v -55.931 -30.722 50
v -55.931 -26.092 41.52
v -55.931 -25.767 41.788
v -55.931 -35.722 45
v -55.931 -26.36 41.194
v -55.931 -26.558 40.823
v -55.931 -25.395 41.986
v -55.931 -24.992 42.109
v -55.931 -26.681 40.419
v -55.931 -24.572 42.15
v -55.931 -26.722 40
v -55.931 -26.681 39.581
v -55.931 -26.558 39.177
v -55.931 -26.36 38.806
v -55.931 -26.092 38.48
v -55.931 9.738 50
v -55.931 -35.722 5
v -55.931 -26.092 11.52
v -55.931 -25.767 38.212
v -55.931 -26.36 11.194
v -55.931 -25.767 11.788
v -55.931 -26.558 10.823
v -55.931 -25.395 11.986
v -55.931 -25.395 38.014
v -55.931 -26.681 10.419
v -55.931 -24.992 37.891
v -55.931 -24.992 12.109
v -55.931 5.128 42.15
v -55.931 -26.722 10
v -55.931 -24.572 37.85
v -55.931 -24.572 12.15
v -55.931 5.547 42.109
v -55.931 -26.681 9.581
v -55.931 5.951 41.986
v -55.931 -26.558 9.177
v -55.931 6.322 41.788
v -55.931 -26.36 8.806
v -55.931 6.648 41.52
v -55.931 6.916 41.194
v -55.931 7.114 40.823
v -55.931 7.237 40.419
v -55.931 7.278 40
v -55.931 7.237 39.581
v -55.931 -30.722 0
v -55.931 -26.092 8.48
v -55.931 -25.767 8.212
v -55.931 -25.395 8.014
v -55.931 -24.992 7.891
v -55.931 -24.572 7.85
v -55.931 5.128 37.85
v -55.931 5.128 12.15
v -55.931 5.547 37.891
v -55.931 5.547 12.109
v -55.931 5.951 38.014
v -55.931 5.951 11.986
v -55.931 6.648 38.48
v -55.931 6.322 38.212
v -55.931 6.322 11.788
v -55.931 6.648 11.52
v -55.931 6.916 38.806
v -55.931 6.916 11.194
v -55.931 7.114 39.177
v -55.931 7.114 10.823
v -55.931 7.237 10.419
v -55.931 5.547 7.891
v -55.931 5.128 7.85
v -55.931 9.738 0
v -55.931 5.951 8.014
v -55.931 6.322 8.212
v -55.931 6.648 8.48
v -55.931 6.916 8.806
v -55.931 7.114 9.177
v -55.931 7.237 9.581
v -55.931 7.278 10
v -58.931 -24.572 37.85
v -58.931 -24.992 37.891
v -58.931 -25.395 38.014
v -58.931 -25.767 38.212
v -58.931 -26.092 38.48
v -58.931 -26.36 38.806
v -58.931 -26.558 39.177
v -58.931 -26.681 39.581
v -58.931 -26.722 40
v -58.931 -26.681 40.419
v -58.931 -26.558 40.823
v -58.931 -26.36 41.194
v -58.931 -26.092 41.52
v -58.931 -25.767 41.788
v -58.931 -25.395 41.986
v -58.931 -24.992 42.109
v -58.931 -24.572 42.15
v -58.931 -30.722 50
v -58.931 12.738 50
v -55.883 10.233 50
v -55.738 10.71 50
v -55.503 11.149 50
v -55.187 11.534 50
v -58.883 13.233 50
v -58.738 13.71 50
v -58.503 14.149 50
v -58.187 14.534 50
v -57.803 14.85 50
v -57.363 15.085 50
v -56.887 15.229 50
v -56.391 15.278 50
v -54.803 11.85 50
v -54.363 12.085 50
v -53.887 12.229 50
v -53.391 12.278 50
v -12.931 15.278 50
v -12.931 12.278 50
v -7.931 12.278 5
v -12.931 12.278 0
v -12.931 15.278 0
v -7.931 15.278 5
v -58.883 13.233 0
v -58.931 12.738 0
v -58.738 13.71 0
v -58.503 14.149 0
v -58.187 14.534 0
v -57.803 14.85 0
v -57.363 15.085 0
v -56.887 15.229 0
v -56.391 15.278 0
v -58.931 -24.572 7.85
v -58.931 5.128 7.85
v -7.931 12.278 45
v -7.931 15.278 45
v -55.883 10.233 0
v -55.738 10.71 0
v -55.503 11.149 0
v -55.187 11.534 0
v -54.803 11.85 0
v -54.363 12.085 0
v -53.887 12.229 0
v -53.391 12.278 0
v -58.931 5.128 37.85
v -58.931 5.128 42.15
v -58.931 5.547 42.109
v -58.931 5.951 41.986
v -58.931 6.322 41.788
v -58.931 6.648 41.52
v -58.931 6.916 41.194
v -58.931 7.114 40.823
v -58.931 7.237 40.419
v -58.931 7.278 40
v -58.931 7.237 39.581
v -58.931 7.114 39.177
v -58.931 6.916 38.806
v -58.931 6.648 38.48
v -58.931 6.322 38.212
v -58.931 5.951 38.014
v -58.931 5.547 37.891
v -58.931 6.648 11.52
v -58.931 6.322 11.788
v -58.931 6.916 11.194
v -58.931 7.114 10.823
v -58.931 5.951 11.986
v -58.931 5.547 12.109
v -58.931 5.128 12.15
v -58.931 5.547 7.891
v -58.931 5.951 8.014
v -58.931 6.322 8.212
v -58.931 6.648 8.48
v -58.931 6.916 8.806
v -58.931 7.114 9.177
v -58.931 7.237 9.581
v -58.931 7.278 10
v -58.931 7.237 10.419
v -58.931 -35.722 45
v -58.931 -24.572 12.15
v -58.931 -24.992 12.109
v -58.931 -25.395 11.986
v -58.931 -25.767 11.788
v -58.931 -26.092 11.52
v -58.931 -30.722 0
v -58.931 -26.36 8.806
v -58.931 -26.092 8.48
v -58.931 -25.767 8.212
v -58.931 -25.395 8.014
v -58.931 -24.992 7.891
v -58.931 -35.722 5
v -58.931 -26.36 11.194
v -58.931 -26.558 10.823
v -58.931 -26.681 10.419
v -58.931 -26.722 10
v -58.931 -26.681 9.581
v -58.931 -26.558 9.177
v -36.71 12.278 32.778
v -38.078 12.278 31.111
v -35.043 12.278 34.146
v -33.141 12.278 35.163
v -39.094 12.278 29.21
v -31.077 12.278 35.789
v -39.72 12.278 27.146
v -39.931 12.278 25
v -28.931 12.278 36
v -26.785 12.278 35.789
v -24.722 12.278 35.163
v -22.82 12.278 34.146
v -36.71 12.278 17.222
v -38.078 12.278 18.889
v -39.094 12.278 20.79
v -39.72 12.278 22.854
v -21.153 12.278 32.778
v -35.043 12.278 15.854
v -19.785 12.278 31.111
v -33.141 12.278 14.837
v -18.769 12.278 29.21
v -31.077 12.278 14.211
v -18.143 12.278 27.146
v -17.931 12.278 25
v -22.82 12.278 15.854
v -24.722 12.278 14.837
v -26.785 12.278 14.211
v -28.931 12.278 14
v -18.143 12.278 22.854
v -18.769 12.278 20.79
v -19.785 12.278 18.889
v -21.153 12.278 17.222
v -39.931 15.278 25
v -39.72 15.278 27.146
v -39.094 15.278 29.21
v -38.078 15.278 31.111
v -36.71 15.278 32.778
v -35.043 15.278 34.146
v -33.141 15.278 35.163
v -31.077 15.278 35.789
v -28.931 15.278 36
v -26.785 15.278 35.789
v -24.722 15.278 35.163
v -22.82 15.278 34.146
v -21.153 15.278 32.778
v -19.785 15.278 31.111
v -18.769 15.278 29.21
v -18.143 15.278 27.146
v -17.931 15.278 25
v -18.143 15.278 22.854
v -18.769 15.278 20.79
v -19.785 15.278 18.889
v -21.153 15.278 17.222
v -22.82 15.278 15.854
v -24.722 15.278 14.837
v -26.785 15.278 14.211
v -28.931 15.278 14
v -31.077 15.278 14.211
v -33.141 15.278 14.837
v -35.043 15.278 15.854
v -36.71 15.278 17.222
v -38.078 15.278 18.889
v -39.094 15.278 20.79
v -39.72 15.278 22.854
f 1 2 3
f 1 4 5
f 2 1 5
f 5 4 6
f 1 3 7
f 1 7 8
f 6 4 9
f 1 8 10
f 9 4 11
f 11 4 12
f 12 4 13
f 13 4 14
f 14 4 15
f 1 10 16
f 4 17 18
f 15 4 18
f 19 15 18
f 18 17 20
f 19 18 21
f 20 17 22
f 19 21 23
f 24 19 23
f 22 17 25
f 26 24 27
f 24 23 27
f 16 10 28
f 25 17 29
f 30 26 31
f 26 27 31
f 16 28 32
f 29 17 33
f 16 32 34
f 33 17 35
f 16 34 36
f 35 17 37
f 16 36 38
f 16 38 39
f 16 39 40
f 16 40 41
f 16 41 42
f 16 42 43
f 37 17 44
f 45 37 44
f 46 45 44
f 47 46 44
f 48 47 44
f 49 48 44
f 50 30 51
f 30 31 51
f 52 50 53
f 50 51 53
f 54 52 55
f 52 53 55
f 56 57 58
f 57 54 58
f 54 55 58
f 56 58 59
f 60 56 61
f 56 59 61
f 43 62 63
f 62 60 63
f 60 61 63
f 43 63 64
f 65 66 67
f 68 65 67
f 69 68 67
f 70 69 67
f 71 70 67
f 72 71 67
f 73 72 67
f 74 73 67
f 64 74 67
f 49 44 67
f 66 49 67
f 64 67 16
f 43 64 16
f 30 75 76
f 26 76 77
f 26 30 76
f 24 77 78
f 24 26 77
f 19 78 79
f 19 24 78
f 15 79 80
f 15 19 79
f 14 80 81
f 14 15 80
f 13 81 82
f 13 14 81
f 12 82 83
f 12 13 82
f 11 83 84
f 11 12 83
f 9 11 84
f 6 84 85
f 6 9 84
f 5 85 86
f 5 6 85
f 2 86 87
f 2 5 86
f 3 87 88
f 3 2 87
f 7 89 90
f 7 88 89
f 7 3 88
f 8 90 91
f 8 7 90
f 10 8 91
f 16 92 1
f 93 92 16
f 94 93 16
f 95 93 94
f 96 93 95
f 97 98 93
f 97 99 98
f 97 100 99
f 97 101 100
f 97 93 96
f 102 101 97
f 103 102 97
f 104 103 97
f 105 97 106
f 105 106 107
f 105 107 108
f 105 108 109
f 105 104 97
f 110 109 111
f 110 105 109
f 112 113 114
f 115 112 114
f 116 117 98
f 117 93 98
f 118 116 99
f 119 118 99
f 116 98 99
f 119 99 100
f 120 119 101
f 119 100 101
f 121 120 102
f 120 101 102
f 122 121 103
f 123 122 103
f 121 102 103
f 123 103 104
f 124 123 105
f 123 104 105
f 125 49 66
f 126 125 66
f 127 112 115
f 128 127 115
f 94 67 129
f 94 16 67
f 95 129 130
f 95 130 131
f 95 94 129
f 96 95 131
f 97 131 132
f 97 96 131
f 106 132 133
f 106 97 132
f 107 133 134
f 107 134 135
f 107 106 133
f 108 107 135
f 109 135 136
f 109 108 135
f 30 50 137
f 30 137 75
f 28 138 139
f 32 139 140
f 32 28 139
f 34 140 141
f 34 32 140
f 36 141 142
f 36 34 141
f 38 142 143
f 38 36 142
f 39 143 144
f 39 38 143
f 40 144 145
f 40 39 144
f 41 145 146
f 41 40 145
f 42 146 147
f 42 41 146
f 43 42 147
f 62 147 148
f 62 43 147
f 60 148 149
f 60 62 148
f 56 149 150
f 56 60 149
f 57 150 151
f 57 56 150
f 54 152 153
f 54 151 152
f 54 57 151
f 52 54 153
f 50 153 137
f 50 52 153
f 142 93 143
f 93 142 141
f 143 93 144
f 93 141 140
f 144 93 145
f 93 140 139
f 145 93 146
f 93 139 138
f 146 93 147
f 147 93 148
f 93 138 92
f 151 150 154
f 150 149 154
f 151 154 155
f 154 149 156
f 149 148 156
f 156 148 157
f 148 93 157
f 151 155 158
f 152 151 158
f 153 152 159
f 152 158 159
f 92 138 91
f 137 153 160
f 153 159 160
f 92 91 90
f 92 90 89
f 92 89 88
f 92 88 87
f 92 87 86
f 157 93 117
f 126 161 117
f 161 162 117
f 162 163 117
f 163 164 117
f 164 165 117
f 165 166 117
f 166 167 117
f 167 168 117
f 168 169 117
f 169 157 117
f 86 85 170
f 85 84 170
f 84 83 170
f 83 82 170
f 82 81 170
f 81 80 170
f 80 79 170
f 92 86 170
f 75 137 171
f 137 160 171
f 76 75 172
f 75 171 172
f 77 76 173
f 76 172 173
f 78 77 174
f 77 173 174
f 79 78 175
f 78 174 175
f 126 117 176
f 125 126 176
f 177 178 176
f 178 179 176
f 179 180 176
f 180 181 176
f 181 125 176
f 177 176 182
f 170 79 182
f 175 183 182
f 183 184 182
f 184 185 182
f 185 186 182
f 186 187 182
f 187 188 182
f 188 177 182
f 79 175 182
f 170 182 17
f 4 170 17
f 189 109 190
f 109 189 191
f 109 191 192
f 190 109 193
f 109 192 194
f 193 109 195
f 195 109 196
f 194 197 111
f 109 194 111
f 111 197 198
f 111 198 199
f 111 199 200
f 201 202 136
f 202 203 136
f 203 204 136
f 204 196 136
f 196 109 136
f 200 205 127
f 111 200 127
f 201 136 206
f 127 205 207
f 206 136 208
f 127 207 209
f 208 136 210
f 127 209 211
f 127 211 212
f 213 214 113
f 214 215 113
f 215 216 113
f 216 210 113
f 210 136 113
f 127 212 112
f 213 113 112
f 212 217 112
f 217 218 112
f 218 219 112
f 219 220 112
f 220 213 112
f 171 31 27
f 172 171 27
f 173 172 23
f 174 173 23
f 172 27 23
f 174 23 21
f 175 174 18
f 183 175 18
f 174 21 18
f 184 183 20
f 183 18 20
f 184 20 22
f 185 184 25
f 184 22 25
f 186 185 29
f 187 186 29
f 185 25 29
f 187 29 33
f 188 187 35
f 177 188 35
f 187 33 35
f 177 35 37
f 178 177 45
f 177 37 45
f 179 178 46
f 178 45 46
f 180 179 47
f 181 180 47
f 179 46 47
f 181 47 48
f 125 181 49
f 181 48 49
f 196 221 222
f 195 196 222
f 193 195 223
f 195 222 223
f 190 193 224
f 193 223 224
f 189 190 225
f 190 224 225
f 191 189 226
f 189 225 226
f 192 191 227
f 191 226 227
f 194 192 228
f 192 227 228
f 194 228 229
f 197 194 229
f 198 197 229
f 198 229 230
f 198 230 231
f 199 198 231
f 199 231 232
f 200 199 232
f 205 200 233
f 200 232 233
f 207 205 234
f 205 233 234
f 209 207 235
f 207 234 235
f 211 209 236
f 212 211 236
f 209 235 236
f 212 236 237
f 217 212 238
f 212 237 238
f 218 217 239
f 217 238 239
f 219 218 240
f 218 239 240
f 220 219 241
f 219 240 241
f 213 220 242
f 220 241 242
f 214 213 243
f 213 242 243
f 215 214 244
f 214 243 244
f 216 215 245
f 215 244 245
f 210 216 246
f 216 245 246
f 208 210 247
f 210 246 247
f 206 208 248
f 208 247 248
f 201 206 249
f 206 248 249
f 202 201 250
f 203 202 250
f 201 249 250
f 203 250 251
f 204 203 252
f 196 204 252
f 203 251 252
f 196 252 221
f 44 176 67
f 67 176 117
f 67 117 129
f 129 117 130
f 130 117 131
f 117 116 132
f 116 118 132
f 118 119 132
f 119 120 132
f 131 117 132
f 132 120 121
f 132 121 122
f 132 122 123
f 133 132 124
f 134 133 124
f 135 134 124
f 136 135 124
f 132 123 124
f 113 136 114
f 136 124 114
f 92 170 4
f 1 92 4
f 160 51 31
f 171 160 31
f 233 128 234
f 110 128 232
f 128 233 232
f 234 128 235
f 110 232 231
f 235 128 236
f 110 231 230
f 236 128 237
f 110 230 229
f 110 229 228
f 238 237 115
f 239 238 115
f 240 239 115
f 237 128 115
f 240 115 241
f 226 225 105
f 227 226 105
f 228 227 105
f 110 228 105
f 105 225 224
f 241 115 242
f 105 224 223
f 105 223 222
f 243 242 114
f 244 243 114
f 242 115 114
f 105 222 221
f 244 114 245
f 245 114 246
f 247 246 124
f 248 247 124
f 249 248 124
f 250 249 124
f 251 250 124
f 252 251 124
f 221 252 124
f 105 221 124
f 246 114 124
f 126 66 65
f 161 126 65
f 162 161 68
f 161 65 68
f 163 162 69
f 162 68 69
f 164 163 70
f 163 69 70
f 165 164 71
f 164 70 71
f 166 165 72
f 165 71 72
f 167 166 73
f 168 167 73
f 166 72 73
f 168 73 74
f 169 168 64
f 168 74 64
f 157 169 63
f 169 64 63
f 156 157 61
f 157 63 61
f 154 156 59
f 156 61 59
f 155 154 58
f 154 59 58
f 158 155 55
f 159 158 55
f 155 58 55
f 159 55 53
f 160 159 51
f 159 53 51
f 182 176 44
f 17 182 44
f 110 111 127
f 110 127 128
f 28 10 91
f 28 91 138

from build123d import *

# Parameters (mm, degrees)
BOSS_EXTRUDE1_DEPTH = 50
CHAMFER1_SIZE       = 5
FILLET1_R           = 2.54
CUT_EXTRUDE1_DEPTH  = 50
SKETCH4_R           = 11
CUT_EXTRUDE2_DEPTH  = 3


with BuildPart() as part:
    # Sketch1 → Boss-Extrude1 (new body)
    with BuildSketch(Plane.XY):
        Polygon((-58.93139542, -35.722112977), (-55.93139542, -35.722112977), (-55.93139542, 12.277887023), (-7.93139542, 12.277887023), (-7.93139542, 15.277887023), (-58.93139542, 15.277887023), align=None)
    extrude(amount=BOSS_EXTRUDE1_DEPTH)

    # Chamfer1
    chamfer1_edges = [part.edges().sort_by_distance(p)[0] for p in [
        (-7.93139542, 13.777887023, 50),
        (-7.93139542, 13.777887023, 0),
        (-57.43139542, -35.722112977, 50),
        (-57.43139542, -35.722112977, 0),
    ]]
    chamfer(chamfer1_edges, length=CHAMFER1_SIZE)

    # Fillet1
    fillet1_edges = [part.edges().sort_by_distance(p)[0] for p in [
        (-58.93139542, 15.277887023, 25),
        (-55.93139542, 12.277887023, 25),
    ]]
    fillet(fillet1_edges, radius=FILLET1_R)

    # Sketch3 → Cut-Extrude1 (cut)
    with BuildSketch(Plane(origin=(-55.93139542, 0, 0), x_dir=(0, 0, -1), z_dir=(1, 0, 0))):
        with BuildLine():
            Line((-37.85, 5.127887023), (-37.85, -24.572112977))
            ThreePointArc((-37.85, -24.572112977), (-40, -26.722112977), (-42.15, -24.572112977))
            Line((-42.15, -24.572112977), (-42.15, 5.127887023))
            ThreePointArc((-42.15, 5.127887023), (-40, 7.277887023), (-37.85, 5.127887023))
        make_face()
        with BuildLine():
            Line((-12.15, 5.127887023), (-12.15, -24.572112977))
            ThreePointArc((-12.15, -24.572112977), (-10, -26.722112977), (-7.85, -24.572112977))
            Line((-7.85, -24.572112977), (-7.85, 5.127887023))
            ThreePointArc((-7.85, 5.127887023), (-10, 7.277887023), (-12.15, 5.127887023))
        make_face()
    extrude(amount=-CUT_EXTRUDE1_DEPTH, mode=Mode.SUBTRACT)

    # Sketch4 → Cut-Extrude2 (cut)
    with BuildSketch(Plane(origin=(0, 15.277887023, 0), x_dir=(1, 0, 0), z_dir=(0, 1, 0))):
        with Locations(Location((-28.93139542, -25, 0), (0, 0, 180))):
            Circle(SKETCH4_R)
    extrude(amount=-CUT_EXTRUDE2_DEPTH, mode=Mode.SUBTRACT)


solid = part.part
